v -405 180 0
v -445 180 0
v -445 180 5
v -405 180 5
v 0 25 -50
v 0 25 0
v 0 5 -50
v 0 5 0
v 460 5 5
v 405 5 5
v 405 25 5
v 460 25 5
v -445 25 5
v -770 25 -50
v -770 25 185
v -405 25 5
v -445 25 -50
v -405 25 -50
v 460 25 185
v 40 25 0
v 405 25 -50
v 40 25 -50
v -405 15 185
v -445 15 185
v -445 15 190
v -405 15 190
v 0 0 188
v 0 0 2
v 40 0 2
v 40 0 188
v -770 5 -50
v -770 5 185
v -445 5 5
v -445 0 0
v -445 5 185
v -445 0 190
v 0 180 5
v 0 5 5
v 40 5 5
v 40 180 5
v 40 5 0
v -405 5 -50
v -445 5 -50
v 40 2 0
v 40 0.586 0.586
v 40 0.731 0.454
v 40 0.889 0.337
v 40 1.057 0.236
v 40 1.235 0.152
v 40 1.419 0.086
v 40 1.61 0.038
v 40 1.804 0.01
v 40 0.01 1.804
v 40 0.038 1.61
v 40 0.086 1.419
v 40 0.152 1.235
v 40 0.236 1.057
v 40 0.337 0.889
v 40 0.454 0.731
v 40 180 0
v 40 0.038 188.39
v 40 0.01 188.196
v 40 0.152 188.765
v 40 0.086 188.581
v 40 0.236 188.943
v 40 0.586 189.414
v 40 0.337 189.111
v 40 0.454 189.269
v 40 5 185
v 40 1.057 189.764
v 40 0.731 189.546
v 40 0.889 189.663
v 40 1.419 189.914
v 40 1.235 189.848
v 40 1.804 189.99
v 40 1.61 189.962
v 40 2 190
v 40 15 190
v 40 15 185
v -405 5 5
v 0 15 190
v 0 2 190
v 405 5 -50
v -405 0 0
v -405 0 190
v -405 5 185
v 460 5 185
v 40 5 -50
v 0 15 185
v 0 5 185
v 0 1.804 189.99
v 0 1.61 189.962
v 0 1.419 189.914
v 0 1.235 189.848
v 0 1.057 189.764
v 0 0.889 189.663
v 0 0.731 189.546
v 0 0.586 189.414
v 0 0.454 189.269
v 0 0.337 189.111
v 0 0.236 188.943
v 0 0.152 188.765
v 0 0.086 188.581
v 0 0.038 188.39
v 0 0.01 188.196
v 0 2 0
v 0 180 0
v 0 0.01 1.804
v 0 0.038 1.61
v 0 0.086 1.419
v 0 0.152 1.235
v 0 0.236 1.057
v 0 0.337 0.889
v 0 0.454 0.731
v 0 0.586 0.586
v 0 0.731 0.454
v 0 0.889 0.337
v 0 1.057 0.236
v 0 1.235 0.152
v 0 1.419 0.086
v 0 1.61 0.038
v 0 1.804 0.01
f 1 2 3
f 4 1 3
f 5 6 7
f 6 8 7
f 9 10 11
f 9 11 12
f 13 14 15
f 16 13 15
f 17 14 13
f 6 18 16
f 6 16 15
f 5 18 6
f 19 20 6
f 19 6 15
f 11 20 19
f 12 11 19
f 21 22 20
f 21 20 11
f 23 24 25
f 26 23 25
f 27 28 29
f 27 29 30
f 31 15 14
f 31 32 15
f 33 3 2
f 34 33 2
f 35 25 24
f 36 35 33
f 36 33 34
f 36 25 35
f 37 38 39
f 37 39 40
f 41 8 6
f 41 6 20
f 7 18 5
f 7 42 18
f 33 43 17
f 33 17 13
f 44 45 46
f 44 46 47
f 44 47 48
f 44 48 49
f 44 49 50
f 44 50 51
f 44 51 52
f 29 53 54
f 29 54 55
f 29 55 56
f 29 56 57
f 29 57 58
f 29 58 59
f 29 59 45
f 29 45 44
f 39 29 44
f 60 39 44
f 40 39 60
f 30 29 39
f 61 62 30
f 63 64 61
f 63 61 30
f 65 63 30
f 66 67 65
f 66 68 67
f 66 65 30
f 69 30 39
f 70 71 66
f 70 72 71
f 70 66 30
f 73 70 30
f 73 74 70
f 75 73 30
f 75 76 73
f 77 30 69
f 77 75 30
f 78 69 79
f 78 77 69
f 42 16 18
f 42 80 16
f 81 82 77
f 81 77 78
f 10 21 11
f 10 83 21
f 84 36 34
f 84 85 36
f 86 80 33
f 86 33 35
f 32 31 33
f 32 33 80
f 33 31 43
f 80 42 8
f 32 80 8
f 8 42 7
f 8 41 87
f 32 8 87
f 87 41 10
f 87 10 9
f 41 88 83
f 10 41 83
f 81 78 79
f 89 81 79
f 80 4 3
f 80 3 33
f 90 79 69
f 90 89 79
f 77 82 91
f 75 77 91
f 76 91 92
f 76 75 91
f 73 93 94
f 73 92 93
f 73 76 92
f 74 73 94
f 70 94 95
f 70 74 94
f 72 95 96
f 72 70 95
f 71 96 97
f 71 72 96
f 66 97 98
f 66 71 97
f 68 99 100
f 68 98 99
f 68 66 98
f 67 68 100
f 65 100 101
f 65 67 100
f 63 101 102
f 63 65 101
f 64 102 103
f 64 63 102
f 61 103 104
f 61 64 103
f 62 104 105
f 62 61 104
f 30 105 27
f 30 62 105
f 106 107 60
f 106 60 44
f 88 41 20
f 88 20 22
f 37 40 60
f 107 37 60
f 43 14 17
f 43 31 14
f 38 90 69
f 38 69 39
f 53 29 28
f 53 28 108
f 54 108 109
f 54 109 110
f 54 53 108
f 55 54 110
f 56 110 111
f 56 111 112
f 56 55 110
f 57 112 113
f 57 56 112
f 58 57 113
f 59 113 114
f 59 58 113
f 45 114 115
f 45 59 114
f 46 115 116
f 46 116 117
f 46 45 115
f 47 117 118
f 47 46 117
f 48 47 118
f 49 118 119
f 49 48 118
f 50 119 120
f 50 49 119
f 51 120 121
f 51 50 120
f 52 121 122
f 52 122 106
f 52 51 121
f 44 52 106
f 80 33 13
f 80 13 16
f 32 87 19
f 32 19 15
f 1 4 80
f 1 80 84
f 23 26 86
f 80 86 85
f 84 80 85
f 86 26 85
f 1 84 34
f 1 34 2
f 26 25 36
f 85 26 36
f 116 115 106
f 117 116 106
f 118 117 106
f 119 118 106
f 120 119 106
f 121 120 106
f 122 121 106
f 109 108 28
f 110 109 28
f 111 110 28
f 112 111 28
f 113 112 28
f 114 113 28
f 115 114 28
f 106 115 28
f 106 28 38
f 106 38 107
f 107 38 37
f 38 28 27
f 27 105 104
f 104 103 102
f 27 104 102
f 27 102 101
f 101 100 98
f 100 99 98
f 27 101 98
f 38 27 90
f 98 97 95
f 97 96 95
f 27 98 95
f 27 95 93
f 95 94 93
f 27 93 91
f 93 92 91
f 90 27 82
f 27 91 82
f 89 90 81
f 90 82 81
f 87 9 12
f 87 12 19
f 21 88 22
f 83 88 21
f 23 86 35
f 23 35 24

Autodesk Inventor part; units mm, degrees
ref_plane "YZ Plane" through (0, 0, 0) normal (1, 0, 0) x (0, 1, 0)
ref_plane "XZ Plane" through (0, 0, 0) normal (0, 1, 0) x (-1, 0, 0)
sketch "Sketch1" plane through (0, 0, 0) normal (1, 0, 0) x (0, 1, 0)
  line L0 (0, 0) -> (0, 190)
  line L1 (0, 190) -> (15, 190)
  line L2 (15, 190) -> (15, 185)
  line L3 (15, 185) -> (5, 185)
  line L4 (5, 185) -> (5, 5)
  line L5 (5, 5) -> (180, 5)
  line L6 (180, 5) -> (180, 0)
  line L7 (180, 0) -> (0, 0)
  line L8 (5, 95) -> (0, 95) construction
  dimension "d0" = 190
  dimension "d1" = 15
  dimension "d2" = 180
  dimension "d3" = 5
extrude "Extrusion1" add sketch "Sketch1" along normal blind 40
fillet "Fillet1" radius 2 2 edges at (20, 0, 190) (20, 0, 0)
sketch "Sketch2" plane through (0, 5, 185) normal (0, 1, 0) x (1, 0, 0)
  line L0 (460, 0) -> (-770, 0)
  line L1 (-770, 0) -> (-770, 235)
  line L2 (-770, 235) -> (460, 235)
  line L3 (460, 235) -> (460, 0)
  line L4 (0, 0) -> (40, 0) projected
  line L5 (40, 180) -> (40, 0) projected
  line L6 (-405, 235) -> (-405, 0) construction
  line L7 (0, 180) -> (0, 0) construction
  line L8 (-445, 235) -> (-445, 0) construction
  line L9 (-445, 180) -> (-405, 180)
  line L10 (-445, 235) -> (-445, 180)
  line L11 (-405, 180) -> (-405, 235)
  line L12 (0, 185) -> (40, 185)
  line L13 (0, 180) -> (40, 180) projected
  line L14 (0, 180) -> (40, 180)
  line L15 (40, 180) -> (40, 235)
  line L16 (0, 180) -> (0, 235)
  line L17 (405, 235) -> (405, 180)
  line L18 (405, 180) -> (460, 180)
  dimension "d8" = 420
  dimension "d9" = 405
  dimension "d10" = 40
  dimension "d11" = 325
  dimension "d14" = 50
  dimension "d15" = 55
  dimension "d16" = 55
extrude "Extrusion2" add sketch "Sketch2" along normal blind 20 separate body contours L0 L5 L15 L2 L17 L18 L3 | L0 L1 L2 L10 L9 L11 L16 L13 L5 | L13 L16 L12 L15
ref_plane "Work Plane1" through (-202.5, 5, -50) normal (-1, 0, 0) x (0, 0, 1)
mirror "Mirror1" about plane through (-202.5, 5, -50) normal (-1, 0, 0) of "Extrusion1" bodies 1
properties part number "TopShelf"
